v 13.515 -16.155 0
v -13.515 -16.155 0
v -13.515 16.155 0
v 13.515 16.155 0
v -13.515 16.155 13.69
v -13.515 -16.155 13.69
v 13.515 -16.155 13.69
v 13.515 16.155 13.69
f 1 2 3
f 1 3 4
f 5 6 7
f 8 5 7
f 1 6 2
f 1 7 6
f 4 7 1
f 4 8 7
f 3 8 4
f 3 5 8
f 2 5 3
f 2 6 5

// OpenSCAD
// Values taken from datasheet
// http://www.farnell.com/datasheets/1337718.pdf?_ga=2.65563566.1225228608.1593261089-1855792729.1592068583

TRANSFORMER_LENGTH = 32.31;
TRANSFORMER_WIDTH = 27.03;
TRANSFORMER_HEIGHT = 13.69;


// Increase steps in render to have quality circles
$fs=0.01;

module BasicShape() {
    linear_extrude(height = TRANSFORMER_HEIGHT, convexity = 10, twist = 0)
        square([TRANSFORMER_WIDTH, TRANSFORMER_LENGTH], center= true);
}

module CompleteModel() {
    BasicShape();
}

CompleteModel();
